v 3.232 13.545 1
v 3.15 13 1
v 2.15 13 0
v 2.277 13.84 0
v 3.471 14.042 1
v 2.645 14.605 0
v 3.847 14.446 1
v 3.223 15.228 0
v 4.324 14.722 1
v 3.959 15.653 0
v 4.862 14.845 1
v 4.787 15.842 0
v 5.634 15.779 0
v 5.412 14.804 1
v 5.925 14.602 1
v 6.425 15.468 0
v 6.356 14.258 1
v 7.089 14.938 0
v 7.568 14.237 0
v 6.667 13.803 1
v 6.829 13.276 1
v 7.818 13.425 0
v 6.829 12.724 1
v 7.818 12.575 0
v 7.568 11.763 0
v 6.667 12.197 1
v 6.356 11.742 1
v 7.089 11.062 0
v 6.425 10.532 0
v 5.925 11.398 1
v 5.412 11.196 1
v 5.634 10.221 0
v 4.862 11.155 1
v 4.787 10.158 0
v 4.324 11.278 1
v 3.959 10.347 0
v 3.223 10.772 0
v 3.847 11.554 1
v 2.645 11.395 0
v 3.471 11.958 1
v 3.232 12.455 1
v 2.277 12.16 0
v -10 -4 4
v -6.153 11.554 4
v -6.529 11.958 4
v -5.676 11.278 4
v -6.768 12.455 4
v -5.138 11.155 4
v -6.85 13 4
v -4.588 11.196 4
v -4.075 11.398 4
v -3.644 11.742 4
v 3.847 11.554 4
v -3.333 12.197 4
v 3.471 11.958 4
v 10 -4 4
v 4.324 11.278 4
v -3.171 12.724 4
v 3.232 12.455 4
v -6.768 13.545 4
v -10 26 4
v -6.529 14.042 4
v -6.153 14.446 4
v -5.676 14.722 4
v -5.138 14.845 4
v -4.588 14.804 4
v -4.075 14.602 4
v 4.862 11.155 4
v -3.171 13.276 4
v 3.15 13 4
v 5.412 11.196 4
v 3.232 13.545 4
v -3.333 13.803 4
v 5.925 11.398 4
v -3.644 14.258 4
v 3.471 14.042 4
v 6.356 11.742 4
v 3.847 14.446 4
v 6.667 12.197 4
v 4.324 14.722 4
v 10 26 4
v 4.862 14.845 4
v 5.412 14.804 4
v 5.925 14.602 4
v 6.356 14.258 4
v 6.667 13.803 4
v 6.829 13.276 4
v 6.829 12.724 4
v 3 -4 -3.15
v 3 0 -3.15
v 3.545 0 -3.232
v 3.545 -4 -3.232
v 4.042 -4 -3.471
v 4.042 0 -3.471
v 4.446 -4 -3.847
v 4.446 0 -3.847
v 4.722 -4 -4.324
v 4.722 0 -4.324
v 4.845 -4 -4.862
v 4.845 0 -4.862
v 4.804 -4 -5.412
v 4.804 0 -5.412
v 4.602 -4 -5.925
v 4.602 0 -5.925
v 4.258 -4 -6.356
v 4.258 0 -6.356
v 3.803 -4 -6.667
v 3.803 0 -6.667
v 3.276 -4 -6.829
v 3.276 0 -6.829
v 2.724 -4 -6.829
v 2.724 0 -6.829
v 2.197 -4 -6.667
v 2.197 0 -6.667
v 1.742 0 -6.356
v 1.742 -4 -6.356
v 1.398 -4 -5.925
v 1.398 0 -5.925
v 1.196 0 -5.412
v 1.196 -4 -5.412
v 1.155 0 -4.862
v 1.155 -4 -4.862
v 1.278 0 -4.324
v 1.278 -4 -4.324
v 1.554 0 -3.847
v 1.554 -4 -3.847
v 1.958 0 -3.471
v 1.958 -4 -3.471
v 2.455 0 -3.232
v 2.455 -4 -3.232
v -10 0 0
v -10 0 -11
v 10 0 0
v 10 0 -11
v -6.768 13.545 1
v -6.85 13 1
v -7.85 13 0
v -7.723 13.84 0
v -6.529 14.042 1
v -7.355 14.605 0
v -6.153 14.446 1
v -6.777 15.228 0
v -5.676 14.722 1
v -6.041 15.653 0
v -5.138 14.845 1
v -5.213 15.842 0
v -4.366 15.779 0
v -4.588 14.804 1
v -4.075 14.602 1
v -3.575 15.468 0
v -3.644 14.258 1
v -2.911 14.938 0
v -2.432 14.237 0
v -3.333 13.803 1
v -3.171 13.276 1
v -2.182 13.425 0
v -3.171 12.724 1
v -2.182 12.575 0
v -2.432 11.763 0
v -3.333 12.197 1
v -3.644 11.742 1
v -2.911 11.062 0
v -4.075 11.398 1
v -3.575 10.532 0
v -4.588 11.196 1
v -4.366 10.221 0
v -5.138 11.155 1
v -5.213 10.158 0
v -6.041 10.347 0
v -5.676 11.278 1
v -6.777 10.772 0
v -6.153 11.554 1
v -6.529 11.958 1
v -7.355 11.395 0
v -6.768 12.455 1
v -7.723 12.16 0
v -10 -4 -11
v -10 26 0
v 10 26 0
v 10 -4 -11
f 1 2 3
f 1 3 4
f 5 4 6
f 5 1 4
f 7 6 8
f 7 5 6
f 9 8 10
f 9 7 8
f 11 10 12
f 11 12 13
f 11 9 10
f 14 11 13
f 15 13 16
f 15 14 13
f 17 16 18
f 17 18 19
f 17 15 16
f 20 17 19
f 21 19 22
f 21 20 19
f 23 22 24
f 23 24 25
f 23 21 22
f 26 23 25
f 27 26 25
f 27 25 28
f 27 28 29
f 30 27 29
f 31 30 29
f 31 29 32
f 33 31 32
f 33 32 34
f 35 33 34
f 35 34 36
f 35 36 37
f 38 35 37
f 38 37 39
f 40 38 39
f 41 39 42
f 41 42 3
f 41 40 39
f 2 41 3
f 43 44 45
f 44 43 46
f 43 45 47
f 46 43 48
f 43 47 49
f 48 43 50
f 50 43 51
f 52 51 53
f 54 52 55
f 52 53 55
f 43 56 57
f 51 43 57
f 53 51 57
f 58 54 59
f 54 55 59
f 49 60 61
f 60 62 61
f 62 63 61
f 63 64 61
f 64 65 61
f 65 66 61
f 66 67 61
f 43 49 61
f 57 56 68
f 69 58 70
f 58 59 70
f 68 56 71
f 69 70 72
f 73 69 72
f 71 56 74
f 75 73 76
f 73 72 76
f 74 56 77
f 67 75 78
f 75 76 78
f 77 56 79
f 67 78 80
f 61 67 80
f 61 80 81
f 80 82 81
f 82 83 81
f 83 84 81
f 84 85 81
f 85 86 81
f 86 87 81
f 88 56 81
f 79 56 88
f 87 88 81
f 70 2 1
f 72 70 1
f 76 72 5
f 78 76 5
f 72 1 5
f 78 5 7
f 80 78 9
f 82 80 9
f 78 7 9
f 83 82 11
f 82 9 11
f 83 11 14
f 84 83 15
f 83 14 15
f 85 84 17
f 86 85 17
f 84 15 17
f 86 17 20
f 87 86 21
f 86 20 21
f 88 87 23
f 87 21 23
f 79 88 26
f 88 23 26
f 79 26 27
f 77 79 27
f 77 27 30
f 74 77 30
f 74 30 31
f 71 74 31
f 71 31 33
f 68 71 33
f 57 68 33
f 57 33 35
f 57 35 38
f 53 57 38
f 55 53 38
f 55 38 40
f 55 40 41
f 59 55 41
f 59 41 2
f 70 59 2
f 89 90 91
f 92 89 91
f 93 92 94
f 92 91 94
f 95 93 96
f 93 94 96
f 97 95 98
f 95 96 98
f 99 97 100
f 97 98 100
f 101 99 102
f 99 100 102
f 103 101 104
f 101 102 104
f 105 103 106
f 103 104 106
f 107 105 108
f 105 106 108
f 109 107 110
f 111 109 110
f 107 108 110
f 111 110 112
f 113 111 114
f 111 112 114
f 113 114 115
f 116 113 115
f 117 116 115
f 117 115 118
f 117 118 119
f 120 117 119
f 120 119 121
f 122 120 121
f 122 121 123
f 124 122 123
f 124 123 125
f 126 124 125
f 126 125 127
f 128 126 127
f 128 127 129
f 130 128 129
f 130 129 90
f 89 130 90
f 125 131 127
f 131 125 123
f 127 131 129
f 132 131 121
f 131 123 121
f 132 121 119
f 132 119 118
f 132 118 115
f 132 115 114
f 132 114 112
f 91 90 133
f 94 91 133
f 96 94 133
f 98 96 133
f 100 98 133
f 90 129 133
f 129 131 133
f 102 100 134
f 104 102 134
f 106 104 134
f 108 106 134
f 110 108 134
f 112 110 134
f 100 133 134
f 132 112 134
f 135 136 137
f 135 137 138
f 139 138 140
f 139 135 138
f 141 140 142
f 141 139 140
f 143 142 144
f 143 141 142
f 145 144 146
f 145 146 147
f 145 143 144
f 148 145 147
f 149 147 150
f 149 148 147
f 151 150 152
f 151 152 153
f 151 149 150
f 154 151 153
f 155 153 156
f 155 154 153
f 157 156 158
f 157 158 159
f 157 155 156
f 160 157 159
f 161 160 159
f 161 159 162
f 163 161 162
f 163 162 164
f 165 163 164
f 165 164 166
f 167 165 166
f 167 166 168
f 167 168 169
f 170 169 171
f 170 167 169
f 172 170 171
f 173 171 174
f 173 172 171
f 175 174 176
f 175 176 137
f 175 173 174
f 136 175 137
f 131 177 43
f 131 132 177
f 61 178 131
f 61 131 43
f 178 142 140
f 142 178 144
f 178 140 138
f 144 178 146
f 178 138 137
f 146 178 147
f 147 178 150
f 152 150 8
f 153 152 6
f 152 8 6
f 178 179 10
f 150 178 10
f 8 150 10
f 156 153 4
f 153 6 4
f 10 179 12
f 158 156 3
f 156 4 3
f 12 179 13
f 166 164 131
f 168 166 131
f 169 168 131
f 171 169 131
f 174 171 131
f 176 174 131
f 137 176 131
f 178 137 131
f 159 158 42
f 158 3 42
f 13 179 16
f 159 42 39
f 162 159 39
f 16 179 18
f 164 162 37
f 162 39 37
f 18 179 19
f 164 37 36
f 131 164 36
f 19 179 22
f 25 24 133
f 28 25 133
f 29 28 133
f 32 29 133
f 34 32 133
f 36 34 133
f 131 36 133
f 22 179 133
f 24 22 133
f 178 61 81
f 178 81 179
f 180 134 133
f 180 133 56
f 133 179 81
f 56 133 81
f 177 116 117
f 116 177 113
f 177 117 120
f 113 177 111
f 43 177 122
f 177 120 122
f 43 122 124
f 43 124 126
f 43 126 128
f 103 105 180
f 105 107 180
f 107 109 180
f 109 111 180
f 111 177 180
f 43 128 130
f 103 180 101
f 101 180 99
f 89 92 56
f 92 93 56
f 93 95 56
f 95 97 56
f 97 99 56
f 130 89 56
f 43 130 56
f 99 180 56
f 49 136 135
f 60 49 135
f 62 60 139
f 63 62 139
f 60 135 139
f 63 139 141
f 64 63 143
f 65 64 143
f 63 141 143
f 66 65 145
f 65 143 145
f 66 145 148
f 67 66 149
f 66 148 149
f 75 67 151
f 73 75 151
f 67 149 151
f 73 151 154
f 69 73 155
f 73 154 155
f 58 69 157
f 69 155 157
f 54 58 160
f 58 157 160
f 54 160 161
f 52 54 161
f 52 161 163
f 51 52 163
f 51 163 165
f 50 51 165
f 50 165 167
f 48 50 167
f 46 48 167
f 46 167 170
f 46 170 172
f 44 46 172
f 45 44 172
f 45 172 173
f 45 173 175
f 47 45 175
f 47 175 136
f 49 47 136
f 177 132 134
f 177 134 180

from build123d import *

# Parameters (mm, degrees)
BOSS_EXTRUDE1_DEPTH = 10
SKETCH2_R           = 1.85
CUT_EXTRUDE1_DEPTH  = 30.949958264
BOSS_EXTRUDE2_DEPTH = 10
SKETCH4_R           = 1.85
CUT_EXTRUDE2_DEPTH  = 30.949958264
CHAMFER1_SIZE       = 1


with BuildPart() as part:
    # Sketch1 → Boss-Extrude1 (new body)
    with BuildSketch(Plane(origin=(0, 0, 0), x_dir=(0, 0, -1), z_dir=(1, 0, 0))):
        Polygon((-4, 26), (0, 26), (0, 0), (11, 0), (11, -4), (-4, -4), align=None)
    extrude(amount=BOSS_EXTRUDE1_DEPTH)

    # Sketch2 → Cut-Extrude1 (cut, through all)
    with BuildSketch(Plane(origin=(0, 0, 0), x_dir=(1, 0, 0), z_dir=(0, 1, 0))):
        with Locations(Location((3, 5, 0), (0, 0, 270))):
            Circle(SKETCH2_R)
    extrude(amount=-CUT_EXTRUDE1_DEPTH, mode=Mode.SUBTRACT)

    # Sketch5 → Boss-Extrude2 (add)
    with BuildSketch(Plane.ZY):
        Polygon((-11, -4), (4, -4), (4, 26), (0, 26), (0, 0), (-11, 0), align=None)
    extrude(amount=BOSS_EXTRUDE2_DEPTH)

    # Sketch4 → Cut-Extrude2 (cut, through all)
    with BuildSketch(Plane(origin=(0, 0, 0), x_dir=(-1, 0, 0), z_dir=(0, 0, -1))):
        with Locations((-5, 13)):
            Circle(SKETCH4_R)
        with Locations((5, 13)):
            Circle(SKETCH4_R)
    extrude(amount=-CUT_EXTRUDE2_DEPTH, mode=Mode.SUBTRACT)

    # Chamfer1
    chamfer1_edges = [part.edges().sort_by_distance(p)[0] for p in [
        (6.85, 13, 0),
        (-3.15, 13, 0),
    ]]
    chamfer(chamfer1_edges, length=CHAMFER1_SIZE)


solid = part.part
